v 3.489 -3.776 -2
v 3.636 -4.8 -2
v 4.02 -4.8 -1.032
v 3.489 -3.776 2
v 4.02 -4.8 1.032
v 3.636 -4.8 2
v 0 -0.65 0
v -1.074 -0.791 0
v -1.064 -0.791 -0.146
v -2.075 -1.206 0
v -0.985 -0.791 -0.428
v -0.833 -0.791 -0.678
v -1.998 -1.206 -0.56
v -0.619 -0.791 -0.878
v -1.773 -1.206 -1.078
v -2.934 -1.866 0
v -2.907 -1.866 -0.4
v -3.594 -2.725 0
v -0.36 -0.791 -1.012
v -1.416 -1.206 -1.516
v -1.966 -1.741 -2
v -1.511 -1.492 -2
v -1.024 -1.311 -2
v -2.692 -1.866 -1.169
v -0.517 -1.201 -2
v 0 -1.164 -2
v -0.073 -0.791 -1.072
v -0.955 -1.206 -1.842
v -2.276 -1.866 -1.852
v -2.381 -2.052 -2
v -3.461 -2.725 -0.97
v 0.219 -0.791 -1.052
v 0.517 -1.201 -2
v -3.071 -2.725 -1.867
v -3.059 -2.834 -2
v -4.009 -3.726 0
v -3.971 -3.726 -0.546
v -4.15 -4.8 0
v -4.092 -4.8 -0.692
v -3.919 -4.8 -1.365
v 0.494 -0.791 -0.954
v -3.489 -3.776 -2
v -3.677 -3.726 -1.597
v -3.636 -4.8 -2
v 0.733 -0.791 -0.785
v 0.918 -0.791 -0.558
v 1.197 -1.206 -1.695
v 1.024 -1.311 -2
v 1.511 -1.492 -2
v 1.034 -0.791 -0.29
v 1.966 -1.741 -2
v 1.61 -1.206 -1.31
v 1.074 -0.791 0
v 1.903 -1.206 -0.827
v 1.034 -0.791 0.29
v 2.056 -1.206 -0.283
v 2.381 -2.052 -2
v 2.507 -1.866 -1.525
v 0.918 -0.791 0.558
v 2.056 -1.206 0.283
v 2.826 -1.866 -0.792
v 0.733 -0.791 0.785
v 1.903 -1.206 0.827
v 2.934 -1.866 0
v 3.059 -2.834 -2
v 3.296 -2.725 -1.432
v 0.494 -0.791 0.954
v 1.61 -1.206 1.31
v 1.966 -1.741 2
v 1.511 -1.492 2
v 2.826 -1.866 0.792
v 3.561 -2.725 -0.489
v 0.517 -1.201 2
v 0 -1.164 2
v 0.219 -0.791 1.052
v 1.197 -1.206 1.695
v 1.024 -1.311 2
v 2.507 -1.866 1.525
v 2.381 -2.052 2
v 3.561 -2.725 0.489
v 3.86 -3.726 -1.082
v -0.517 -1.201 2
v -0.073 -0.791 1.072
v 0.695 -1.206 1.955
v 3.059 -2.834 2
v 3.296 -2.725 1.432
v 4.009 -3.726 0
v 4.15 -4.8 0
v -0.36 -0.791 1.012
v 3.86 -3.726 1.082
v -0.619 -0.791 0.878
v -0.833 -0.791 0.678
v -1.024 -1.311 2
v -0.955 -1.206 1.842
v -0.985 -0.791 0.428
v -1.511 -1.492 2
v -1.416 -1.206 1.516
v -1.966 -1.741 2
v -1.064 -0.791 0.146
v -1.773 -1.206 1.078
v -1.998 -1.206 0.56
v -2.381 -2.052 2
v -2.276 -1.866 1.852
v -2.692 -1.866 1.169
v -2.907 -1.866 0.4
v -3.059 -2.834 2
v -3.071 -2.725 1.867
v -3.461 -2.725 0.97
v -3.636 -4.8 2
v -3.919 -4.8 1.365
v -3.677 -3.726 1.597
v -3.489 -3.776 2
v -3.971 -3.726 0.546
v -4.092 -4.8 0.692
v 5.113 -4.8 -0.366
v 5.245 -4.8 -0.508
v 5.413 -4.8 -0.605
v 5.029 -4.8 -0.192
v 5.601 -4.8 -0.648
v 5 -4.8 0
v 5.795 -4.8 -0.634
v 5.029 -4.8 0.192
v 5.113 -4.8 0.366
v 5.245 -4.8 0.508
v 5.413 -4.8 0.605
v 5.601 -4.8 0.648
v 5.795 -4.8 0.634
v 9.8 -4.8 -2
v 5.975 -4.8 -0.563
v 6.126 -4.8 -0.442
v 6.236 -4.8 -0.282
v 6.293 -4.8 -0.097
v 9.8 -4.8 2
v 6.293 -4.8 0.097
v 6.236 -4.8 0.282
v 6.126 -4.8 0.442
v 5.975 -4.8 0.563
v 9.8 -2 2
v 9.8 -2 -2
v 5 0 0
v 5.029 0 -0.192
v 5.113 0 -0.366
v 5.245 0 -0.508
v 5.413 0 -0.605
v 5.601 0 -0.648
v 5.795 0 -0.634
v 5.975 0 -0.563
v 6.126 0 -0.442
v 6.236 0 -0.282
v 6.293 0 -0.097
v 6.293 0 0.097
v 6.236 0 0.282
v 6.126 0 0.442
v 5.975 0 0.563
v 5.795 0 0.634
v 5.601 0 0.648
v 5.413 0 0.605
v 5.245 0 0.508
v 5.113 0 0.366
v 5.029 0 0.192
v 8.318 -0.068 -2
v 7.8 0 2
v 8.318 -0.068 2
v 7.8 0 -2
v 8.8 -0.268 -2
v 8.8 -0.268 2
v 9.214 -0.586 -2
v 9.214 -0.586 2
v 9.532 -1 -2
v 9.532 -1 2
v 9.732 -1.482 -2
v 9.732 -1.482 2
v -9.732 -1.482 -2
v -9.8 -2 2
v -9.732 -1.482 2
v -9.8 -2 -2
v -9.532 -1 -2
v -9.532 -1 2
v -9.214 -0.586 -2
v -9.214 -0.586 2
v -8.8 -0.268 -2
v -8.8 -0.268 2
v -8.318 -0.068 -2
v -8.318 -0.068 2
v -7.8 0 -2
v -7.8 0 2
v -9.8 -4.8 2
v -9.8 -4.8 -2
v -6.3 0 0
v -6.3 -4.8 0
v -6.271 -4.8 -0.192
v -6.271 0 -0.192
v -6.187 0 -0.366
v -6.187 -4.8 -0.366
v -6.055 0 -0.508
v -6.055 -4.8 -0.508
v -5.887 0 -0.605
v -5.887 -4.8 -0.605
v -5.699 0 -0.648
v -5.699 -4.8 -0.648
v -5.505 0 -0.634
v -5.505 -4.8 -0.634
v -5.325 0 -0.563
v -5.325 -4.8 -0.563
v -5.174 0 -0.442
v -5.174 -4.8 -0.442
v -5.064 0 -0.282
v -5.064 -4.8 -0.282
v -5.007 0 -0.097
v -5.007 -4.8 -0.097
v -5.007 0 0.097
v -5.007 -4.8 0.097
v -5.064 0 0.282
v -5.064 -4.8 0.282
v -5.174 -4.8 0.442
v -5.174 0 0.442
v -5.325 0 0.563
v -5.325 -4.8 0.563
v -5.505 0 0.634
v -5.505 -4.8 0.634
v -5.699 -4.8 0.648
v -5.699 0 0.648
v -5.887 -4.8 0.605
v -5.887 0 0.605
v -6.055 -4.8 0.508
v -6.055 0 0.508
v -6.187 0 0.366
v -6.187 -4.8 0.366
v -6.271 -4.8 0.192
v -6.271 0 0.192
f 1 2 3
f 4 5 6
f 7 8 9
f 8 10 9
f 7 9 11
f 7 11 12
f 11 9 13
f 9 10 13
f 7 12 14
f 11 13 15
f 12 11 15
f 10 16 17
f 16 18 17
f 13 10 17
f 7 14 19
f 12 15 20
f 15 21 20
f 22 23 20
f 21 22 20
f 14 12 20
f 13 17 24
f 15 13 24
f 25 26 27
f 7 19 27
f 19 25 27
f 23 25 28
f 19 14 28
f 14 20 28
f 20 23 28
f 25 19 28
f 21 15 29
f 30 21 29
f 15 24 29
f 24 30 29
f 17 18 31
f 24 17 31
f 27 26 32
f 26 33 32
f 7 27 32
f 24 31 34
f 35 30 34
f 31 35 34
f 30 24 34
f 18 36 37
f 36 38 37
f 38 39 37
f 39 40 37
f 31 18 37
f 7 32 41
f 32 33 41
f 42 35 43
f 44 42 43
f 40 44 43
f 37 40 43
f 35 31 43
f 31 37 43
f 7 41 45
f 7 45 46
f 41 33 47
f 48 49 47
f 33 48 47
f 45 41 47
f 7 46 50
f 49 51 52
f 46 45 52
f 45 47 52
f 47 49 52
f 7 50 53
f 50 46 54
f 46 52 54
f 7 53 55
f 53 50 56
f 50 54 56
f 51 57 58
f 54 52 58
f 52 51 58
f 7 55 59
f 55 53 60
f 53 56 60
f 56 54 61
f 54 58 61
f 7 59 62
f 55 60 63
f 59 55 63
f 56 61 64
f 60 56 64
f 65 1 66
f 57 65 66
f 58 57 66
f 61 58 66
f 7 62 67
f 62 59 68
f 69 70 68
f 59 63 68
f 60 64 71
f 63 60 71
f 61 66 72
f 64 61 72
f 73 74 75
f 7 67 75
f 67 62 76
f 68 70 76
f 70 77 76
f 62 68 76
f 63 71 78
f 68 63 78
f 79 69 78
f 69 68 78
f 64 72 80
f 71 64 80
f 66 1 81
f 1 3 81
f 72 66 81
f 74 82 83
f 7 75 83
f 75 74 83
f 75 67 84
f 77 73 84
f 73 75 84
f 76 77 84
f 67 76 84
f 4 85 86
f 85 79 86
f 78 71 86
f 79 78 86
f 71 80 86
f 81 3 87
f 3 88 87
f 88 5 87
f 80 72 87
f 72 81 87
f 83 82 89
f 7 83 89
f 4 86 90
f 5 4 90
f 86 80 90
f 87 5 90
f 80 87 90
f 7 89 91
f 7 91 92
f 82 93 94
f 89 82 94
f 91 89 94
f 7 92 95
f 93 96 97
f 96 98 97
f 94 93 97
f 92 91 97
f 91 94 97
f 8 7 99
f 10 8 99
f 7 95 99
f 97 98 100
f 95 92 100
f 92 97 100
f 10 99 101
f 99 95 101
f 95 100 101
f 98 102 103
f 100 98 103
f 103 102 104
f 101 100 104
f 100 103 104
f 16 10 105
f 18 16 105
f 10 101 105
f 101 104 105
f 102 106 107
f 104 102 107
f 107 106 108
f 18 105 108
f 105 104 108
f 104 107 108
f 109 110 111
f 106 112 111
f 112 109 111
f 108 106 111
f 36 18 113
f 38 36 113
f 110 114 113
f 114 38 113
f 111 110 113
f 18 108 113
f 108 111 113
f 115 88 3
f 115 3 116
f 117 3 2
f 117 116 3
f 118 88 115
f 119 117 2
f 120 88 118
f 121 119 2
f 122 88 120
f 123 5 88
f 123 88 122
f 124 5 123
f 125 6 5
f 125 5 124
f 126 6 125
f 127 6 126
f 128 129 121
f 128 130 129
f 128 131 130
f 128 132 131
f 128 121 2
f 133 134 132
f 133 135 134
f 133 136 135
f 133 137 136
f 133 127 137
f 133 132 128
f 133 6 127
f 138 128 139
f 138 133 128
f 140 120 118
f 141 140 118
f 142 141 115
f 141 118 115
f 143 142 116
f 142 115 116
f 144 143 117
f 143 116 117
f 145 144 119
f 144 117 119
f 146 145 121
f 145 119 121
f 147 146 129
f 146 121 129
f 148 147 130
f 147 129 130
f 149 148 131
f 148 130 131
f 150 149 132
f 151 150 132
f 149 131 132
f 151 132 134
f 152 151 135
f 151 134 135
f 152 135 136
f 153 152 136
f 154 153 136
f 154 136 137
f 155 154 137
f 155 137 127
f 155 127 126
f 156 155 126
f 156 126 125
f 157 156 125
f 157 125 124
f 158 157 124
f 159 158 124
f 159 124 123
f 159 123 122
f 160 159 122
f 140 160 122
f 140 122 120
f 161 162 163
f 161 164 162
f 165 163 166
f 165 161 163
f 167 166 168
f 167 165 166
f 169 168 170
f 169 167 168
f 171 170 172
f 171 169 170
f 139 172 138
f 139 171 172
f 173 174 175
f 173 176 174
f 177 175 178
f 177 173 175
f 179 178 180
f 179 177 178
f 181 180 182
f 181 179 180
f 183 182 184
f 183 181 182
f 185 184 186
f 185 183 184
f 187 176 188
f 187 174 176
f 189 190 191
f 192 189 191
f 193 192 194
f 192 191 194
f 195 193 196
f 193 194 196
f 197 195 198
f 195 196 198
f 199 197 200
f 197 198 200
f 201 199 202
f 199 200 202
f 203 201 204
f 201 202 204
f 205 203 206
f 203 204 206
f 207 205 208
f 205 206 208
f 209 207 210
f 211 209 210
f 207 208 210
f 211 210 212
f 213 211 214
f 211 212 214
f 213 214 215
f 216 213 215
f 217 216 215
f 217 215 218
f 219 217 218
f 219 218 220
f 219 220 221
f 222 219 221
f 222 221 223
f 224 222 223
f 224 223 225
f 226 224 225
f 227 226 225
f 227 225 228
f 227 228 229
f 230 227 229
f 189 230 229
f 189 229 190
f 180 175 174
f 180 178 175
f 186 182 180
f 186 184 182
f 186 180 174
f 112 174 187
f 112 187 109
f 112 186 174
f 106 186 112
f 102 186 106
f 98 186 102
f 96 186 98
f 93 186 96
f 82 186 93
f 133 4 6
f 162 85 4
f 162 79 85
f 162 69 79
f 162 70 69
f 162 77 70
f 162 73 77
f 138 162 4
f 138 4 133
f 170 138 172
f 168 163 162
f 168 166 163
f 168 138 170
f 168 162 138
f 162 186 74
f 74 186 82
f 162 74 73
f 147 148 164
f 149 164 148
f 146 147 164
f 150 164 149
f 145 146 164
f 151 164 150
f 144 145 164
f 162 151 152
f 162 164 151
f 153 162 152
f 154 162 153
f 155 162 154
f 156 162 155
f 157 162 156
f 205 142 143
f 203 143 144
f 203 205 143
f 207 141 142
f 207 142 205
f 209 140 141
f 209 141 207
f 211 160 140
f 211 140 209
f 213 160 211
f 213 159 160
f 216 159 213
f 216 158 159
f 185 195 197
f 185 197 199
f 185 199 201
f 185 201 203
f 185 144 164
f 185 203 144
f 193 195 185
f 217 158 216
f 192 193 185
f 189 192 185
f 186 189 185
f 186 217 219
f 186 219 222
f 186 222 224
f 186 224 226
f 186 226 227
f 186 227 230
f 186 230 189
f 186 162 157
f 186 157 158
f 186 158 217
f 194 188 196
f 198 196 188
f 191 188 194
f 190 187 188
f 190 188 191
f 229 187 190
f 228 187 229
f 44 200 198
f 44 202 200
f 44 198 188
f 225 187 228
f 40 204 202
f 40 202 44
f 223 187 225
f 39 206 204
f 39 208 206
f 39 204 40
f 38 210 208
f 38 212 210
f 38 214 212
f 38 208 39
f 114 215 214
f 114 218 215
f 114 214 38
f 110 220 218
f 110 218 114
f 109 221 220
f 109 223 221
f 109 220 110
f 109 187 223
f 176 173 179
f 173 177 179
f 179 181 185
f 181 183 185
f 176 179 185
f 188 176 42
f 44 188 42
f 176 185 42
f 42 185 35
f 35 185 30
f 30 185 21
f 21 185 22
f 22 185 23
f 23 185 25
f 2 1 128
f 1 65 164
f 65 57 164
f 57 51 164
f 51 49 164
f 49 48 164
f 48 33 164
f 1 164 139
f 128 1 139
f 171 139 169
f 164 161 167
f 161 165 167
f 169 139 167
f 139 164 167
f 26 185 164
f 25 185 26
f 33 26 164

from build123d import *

# Parameters (mm, degrees)
EXTRUDE_1_DEPTH = 2
HOLE_WIZARD_1_D = 1.3
FILLET_1_R      = 2


with BuildPart() as part:
    # 草图1 → 凸台-拉伸1 (new, symmetric)
    with BuildSketch(Plane.XY):
        Polygon((-3.464101615, 0), (-9.8, 0), (-9.8, -4.8), (9.8, -4.8), (9.8, 0), (3.464101615, 0), align=None)
    extrude(amount=EXTRUDE_1_DEPTH, both=True)

    # 孔1 (through all)
    with Locations(Plane(origin=(0, 0, 0), x_dir=(1, 0, 0), z_dir=(0, 1, 0))):
        with Locations((-5.65, 0), (5.65, 0)):
            Hole(HOLE_WIZARD_1_D / 2)

    # 草图5 → 切除-旋转1 (revolve, cut)
    with BuildSketch(Plane.XY):
        with BuildLine():
            Line((0, -8.95), (0, -4.8))
            Line((0, -4.8), (0, -0.65))
            ThreePointArc((0, -0.65), (-4.15, -4.8), (0, -8.95))
        make_face()
    revolve(axis=Axis((0, 0, 0), (0, -1, 0)), mode=Mode.SUBTRACT)

    # 圆角1
    fillet_1_edges = [part.edges().sort_by_distance(p)[0] for p in [
        (9.8, 0, 0),
        (-9.8, 0, 0),
    ]]
    fillet(fillet_1_edges, radius=FILLET_1_R)


solid = part.part
